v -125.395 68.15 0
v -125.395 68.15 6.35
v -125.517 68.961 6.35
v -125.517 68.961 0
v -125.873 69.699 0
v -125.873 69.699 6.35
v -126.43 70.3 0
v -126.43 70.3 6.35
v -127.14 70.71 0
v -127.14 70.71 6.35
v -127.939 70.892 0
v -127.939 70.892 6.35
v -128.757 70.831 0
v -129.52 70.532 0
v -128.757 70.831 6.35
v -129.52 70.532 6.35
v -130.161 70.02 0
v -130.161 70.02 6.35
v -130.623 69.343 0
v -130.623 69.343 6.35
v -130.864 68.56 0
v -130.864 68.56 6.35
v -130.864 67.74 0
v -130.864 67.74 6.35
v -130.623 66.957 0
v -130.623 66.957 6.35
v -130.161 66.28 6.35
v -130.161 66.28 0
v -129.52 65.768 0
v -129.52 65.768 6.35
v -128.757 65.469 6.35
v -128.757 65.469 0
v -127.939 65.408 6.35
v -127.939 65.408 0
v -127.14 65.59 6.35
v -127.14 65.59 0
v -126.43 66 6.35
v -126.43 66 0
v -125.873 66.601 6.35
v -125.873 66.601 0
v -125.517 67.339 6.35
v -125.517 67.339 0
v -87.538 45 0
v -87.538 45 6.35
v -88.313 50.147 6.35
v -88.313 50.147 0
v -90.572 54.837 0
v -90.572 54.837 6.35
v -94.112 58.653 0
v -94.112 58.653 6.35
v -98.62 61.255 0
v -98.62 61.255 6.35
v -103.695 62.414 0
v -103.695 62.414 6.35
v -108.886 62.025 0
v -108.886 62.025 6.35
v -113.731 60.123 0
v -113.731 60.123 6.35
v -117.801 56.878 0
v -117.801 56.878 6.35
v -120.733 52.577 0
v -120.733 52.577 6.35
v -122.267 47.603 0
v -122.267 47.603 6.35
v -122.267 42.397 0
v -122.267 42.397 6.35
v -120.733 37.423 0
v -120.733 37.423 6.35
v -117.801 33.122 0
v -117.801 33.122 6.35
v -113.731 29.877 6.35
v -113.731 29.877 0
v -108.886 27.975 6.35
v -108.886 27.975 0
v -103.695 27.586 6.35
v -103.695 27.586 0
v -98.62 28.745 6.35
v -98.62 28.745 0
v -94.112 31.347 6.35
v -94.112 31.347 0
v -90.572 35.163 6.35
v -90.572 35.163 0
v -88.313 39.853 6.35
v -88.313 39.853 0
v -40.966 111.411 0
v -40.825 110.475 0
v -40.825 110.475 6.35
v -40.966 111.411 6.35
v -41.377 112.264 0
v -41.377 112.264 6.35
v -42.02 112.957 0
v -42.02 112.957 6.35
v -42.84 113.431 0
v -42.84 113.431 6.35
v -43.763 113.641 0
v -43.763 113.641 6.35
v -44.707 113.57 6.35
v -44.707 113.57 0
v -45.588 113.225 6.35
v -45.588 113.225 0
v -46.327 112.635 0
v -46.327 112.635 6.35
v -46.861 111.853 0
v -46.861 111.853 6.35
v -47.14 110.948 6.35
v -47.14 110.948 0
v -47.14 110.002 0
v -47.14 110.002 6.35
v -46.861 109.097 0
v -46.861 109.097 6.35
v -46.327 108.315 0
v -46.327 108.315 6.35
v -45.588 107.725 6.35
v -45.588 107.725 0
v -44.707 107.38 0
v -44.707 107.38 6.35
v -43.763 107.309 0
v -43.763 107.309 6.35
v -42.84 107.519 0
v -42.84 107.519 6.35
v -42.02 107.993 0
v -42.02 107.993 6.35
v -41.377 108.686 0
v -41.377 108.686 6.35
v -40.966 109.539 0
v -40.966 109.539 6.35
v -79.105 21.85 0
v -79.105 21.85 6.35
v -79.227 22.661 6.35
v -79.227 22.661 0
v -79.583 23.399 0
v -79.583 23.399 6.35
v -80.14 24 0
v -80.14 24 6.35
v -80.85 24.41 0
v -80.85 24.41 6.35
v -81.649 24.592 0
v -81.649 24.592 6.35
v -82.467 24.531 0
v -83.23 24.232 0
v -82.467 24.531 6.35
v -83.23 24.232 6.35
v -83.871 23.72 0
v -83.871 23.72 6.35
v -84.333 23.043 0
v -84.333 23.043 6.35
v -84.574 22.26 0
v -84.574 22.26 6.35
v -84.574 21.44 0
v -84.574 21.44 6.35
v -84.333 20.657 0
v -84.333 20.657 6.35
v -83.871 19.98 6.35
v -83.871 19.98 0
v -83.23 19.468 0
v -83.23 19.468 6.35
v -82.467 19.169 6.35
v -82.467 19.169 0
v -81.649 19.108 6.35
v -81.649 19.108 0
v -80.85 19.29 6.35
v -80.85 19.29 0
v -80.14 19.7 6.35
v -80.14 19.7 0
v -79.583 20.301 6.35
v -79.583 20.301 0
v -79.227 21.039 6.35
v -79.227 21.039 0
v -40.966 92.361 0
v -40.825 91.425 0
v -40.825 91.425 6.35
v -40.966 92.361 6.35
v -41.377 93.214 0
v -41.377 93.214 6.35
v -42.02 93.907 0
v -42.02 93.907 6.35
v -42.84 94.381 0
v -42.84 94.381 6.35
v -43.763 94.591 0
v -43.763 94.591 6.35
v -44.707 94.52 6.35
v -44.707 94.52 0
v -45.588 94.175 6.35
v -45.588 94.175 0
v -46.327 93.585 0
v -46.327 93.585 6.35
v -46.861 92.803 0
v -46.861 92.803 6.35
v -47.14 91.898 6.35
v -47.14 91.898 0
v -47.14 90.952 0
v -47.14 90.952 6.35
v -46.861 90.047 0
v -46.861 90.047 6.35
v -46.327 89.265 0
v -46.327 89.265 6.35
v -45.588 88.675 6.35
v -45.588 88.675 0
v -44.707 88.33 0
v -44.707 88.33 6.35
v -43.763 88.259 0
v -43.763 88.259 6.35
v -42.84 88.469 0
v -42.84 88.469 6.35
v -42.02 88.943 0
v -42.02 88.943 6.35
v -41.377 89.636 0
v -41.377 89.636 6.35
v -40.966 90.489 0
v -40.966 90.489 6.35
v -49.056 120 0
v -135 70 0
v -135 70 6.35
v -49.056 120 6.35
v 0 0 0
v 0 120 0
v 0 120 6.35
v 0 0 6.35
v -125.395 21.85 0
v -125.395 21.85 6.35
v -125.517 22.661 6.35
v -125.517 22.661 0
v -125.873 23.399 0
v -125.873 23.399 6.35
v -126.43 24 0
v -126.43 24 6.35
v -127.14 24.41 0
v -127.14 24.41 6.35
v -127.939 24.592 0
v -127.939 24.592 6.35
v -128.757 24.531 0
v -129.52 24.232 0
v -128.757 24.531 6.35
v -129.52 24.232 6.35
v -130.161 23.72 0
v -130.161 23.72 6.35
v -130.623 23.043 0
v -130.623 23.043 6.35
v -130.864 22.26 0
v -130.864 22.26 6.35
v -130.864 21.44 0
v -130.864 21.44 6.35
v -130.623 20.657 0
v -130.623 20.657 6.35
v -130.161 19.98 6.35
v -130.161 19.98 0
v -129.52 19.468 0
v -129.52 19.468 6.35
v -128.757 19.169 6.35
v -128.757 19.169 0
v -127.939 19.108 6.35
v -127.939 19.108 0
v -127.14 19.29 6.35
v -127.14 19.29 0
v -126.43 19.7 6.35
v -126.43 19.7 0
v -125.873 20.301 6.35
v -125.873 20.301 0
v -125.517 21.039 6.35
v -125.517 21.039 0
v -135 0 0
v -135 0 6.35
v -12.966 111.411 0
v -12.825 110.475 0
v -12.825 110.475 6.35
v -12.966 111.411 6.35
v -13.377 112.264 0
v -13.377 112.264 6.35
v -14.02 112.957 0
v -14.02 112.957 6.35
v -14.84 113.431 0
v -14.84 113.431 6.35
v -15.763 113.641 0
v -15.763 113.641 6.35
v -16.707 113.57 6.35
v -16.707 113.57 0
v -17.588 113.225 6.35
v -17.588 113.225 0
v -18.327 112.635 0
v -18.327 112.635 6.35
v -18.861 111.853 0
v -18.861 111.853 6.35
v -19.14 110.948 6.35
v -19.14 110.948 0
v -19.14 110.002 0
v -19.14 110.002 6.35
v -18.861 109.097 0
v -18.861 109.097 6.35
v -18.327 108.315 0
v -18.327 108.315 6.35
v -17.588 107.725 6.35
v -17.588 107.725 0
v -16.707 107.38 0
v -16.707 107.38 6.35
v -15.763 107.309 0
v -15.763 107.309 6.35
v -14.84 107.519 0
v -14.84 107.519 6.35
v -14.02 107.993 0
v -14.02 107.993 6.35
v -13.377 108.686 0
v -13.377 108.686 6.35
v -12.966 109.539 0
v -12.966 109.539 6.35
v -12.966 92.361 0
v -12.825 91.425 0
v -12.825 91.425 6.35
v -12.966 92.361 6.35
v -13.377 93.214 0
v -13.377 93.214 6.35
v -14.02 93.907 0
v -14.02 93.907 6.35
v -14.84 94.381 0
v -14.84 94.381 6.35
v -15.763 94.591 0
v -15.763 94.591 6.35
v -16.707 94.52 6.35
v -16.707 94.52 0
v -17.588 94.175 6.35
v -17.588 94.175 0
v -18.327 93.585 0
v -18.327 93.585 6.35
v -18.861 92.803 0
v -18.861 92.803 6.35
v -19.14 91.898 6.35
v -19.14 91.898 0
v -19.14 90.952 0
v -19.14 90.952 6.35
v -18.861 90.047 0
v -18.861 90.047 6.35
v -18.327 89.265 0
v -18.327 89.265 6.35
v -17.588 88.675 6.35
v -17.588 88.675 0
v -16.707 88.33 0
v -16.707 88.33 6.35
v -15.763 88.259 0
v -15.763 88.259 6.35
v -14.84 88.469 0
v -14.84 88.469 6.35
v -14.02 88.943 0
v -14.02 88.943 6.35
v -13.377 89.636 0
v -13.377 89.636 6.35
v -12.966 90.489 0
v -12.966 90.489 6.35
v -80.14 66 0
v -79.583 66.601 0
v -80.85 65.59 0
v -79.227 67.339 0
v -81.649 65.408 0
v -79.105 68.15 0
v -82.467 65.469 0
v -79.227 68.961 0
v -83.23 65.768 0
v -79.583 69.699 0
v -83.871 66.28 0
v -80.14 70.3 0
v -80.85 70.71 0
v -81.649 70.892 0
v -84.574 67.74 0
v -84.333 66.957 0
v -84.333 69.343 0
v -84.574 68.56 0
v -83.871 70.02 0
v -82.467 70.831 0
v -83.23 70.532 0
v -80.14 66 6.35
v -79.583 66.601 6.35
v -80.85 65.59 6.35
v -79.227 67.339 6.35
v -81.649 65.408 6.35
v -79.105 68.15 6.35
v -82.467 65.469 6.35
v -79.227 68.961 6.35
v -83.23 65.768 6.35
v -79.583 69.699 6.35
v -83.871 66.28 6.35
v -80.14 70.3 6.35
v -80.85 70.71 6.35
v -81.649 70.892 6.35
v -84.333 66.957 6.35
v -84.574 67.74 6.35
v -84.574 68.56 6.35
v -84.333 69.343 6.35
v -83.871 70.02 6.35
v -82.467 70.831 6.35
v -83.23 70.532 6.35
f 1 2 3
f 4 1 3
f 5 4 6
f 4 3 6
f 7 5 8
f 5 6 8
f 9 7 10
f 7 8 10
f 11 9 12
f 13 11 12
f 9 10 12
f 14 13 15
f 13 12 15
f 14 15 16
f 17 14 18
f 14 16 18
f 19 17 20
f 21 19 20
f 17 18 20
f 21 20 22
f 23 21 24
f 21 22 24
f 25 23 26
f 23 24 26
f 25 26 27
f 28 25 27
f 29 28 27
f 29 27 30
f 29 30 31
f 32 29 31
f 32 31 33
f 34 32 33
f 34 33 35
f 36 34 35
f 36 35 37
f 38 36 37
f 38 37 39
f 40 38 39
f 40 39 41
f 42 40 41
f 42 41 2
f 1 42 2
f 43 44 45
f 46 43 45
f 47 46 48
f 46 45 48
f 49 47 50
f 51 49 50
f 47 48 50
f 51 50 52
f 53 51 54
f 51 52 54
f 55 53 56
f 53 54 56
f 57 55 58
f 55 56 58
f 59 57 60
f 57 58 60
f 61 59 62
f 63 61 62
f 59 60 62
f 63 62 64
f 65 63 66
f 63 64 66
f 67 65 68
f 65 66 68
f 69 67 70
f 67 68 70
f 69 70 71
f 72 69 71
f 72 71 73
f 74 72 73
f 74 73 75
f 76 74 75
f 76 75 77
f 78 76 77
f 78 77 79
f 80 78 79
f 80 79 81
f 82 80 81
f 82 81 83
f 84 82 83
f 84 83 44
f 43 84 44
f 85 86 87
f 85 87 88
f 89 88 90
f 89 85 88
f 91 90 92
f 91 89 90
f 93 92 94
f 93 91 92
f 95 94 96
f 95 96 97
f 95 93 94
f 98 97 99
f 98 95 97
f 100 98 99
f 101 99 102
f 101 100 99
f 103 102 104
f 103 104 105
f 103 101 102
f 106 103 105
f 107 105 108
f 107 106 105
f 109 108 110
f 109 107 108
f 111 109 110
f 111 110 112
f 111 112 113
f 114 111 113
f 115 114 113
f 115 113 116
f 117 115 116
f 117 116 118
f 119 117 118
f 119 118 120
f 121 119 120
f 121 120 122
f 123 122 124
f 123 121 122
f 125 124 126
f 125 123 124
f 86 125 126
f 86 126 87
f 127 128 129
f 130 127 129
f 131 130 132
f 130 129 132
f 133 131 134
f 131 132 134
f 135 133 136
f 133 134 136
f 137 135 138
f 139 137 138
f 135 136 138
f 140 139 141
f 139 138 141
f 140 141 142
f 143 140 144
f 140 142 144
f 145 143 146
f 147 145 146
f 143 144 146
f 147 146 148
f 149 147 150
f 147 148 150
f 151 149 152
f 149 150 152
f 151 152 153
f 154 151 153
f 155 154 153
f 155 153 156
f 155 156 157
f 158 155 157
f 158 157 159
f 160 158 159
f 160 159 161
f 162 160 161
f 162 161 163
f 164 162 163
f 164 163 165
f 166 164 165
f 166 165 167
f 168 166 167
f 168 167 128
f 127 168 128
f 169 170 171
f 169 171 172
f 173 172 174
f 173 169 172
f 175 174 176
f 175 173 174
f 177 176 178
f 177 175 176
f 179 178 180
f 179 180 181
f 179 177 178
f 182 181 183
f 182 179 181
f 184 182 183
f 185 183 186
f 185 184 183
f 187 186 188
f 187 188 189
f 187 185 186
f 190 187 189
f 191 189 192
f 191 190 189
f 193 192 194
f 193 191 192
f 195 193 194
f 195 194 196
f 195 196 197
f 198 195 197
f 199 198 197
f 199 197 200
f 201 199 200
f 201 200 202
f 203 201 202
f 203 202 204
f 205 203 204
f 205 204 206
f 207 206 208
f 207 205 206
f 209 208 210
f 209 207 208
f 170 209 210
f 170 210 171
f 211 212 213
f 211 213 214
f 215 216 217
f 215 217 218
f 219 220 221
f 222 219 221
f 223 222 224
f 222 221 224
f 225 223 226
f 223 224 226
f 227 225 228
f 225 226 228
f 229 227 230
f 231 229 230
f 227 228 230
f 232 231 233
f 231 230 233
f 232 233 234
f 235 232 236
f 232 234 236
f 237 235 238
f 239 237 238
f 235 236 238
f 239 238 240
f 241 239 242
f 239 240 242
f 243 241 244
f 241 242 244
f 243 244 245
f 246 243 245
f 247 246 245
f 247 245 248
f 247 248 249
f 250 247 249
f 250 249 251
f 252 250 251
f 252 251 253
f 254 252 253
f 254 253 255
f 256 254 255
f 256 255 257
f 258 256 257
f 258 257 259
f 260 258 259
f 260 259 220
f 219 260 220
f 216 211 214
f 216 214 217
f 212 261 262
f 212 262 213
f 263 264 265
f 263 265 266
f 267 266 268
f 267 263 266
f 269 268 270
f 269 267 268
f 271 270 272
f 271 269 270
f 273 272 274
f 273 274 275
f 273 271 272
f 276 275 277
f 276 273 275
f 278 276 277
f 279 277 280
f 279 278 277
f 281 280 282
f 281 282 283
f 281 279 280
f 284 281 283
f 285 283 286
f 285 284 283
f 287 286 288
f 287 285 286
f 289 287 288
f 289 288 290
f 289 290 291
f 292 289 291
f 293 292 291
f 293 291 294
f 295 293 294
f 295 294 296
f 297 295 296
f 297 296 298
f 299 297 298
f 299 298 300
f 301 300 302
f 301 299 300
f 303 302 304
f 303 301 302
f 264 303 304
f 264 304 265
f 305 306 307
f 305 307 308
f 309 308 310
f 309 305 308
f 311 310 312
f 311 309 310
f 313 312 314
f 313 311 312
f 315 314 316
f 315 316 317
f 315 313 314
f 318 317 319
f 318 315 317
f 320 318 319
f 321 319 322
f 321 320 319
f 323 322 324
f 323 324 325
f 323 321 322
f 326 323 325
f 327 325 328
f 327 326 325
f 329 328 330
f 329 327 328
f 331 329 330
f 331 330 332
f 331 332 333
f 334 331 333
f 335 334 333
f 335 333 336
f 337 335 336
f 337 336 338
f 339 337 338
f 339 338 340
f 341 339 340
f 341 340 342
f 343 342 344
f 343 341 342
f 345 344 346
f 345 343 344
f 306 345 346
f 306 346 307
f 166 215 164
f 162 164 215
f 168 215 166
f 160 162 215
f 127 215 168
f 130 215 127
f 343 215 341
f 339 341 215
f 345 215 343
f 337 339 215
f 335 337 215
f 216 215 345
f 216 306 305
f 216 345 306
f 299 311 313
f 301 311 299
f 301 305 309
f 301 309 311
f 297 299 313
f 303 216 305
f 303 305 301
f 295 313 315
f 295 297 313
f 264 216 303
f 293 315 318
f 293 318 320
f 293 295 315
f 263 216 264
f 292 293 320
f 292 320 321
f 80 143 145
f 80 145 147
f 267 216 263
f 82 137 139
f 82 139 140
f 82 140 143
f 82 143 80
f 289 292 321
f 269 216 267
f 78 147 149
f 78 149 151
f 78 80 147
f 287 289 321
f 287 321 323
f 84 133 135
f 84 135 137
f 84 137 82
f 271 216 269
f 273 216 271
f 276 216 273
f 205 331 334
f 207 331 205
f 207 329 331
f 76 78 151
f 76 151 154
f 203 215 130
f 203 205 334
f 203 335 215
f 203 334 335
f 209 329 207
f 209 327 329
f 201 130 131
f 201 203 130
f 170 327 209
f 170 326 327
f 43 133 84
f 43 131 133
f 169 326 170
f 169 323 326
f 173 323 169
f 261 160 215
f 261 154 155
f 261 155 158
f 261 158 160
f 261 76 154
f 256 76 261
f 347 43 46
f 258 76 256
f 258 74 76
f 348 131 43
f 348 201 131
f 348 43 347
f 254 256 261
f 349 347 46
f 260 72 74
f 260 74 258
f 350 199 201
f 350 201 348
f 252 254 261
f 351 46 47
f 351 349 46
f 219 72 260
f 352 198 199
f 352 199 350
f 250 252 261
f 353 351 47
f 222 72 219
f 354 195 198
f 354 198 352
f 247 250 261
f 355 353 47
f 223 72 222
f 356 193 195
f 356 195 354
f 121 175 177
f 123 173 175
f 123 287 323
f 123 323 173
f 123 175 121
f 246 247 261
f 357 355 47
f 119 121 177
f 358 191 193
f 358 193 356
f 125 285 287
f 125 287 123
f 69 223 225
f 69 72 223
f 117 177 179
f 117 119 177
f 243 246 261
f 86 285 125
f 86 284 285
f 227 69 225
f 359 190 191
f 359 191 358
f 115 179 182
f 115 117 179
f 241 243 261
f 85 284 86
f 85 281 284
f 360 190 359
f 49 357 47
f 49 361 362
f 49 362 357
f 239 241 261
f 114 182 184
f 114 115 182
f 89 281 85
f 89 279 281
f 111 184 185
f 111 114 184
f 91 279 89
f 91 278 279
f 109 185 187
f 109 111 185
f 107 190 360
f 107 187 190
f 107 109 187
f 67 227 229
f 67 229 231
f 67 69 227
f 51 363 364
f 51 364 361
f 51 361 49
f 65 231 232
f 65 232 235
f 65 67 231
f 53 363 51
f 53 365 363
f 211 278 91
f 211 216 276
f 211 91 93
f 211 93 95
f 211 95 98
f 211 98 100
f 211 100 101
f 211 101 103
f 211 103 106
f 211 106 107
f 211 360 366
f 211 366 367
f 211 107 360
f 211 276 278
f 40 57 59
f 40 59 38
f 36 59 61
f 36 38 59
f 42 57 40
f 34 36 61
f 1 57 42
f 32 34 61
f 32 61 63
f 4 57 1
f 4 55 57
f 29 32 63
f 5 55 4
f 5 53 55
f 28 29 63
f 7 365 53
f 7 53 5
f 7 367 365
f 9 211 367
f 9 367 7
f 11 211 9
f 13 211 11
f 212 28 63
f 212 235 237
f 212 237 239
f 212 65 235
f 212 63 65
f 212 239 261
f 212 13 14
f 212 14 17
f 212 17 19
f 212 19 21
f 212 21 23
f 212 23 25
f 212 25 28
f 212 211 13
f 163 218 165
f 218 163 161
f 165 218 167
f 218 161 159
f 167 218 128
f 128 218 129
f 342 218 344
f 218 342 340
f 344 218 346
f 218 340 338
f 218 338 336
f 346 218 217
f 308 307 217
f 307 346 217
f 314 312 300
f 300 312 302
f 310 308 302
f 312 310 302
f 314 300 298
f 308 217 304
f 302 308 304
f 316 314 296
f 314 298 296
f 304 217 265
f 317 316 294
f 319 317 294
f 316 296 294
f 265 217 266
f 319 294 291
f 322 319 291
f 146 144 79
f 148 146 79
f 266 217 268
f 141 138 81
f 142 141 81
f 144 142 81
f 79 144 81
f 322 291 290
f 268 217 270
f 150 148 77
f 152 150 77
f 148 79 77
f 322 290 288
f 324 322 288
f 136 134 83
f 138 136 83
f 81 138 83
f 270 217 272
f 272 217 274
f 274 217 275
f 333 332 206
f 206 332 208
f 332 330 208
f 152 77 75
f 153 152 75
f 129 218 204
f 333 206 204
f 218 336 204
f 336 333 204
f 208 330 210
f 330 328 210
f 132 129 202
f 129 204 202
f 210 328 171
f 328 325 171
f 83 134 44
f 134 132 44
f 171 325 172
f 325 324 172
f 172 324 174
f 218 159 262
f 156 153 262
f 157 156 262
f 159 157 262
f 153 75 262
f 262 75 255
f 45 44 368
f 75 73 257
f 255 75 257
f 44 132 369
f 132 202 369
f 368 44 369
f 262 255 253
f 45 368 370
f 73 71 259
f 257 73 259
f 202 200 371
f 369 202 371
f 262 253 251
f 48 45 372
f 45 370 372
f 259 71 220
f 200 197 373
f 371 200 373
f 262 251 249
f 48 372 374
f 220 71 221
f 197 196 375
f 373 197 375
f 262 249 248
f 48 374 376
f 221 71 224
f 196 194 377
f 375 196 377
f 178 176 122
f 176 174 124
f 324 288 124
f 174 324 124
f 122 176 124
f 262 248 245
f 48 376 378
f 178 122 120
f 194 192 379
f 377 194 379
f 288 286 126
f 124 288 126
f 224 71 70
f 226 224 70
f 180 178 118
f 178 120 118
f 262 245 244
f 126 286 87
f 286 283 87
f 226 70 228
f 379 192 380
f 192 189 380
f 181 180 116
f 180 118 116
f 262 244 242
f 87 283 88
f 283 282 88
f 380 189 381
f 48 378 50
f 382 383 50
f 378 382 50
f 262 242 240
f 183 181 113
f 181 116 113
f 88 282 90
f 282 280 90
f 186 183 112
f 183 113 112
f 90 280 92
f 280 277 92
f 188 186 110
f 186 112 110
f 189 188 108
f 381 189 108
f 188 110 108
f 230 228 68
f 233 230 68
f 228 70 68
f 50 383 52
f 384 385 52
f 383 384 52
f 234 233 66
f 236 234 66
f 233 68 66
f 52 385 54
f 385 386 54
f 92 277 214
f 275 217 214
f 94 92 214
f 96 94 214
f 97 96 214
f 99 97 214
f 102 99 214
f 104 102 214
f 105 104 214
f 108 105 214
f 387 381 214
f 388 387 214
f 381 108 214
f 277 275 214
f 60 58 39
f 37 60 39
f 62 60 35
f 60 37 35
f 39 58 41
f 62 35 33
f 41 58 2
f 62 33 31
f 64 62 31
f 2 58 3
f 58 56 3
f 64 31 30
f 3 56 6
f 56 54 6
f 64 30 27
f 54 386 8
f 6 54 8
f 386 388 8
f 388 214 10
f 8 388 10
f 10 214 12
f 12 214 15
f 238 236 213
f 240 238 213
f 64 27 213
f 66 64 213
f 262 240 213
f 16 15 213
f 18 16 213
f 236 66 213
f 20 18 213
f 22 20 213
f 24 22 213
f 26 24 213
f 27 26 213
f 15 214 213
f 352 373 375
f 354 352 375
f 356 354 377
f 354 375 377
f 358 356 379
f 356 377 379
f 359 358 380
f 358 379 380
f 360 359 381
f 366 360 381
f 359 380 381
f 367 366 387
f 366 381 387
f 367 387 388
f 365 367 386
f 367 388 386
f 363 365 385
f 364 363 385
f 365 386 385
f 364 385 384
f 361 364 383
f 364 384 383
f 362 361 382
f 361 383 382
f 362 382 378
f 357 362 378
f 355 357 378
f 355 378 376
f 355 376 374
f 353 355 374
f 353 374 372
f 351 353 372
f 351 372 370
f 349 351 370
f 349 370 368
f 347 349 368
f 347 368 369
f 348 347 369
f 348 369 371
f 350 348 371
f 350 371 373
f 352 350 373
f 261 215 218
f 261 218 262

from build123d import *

# Parameters (mm, degrees)
CROQUIS1_R              = 3.175
SALIENTE_EXTRUIR1_DEPTH = 6.35
CROQUIS2_R              = 2.75
CROQUIS2_R_2            = 17.4625
CORTAR_EXTRUIR1_DEPTH   = 12.7


with BuildPart() as part:
    # Croquis1 → Saliente-Extruir1 (new body)
    with BuildSketch(Plane.XY):
        Polygon((0, 0), (-135, 0), (-135, 70), (-49.056075443, 120), (0, 120), align=None)
        with Locations((-44, 110.475)):
            Circle(CROQUIS1_R, mode=Mode.SUBTRACT)
        with Locations((-16, 110.475)):
            Circle(CROQUIS1_R, mode=Mode.SUBTRACT)
        with Locations((-16, 91.425)):
            Circle(CROQUIS1_R, mode=Mode.SUBTRACT)
        with Locations((-44, 91.425)):
            Circle(CROQUIS1_R, mode=Mode.SUBTRACT)
    extrude(amount=SALIENTE_EXTRUIR1_DEPTH)

    # Croquis2 → Cortar-Extruir1 (cut)
    with BuildSketch(Plane.XY.offset(6.35)):
        with Locations((-128.145, 68.15)):
            Circle(CROQUIS2_R)
        with Locations((-128.145, 21.85)):
            Circle(CROQUIS2_R)
        with Locations((-81.855, 21.85)):
            Circle(CROQUIS2_R)
        with Locations((-81.855, 68.15)):
            Circle(CROQUIS2_R)
        with Locations((-105, 45)):
            Circle(CROQUIS2_R_2)
    extrude(amount=-CORTAR_EXTRUIR1_DEPTH, mode=Mode.SUBTRACT)


solid = part.part
